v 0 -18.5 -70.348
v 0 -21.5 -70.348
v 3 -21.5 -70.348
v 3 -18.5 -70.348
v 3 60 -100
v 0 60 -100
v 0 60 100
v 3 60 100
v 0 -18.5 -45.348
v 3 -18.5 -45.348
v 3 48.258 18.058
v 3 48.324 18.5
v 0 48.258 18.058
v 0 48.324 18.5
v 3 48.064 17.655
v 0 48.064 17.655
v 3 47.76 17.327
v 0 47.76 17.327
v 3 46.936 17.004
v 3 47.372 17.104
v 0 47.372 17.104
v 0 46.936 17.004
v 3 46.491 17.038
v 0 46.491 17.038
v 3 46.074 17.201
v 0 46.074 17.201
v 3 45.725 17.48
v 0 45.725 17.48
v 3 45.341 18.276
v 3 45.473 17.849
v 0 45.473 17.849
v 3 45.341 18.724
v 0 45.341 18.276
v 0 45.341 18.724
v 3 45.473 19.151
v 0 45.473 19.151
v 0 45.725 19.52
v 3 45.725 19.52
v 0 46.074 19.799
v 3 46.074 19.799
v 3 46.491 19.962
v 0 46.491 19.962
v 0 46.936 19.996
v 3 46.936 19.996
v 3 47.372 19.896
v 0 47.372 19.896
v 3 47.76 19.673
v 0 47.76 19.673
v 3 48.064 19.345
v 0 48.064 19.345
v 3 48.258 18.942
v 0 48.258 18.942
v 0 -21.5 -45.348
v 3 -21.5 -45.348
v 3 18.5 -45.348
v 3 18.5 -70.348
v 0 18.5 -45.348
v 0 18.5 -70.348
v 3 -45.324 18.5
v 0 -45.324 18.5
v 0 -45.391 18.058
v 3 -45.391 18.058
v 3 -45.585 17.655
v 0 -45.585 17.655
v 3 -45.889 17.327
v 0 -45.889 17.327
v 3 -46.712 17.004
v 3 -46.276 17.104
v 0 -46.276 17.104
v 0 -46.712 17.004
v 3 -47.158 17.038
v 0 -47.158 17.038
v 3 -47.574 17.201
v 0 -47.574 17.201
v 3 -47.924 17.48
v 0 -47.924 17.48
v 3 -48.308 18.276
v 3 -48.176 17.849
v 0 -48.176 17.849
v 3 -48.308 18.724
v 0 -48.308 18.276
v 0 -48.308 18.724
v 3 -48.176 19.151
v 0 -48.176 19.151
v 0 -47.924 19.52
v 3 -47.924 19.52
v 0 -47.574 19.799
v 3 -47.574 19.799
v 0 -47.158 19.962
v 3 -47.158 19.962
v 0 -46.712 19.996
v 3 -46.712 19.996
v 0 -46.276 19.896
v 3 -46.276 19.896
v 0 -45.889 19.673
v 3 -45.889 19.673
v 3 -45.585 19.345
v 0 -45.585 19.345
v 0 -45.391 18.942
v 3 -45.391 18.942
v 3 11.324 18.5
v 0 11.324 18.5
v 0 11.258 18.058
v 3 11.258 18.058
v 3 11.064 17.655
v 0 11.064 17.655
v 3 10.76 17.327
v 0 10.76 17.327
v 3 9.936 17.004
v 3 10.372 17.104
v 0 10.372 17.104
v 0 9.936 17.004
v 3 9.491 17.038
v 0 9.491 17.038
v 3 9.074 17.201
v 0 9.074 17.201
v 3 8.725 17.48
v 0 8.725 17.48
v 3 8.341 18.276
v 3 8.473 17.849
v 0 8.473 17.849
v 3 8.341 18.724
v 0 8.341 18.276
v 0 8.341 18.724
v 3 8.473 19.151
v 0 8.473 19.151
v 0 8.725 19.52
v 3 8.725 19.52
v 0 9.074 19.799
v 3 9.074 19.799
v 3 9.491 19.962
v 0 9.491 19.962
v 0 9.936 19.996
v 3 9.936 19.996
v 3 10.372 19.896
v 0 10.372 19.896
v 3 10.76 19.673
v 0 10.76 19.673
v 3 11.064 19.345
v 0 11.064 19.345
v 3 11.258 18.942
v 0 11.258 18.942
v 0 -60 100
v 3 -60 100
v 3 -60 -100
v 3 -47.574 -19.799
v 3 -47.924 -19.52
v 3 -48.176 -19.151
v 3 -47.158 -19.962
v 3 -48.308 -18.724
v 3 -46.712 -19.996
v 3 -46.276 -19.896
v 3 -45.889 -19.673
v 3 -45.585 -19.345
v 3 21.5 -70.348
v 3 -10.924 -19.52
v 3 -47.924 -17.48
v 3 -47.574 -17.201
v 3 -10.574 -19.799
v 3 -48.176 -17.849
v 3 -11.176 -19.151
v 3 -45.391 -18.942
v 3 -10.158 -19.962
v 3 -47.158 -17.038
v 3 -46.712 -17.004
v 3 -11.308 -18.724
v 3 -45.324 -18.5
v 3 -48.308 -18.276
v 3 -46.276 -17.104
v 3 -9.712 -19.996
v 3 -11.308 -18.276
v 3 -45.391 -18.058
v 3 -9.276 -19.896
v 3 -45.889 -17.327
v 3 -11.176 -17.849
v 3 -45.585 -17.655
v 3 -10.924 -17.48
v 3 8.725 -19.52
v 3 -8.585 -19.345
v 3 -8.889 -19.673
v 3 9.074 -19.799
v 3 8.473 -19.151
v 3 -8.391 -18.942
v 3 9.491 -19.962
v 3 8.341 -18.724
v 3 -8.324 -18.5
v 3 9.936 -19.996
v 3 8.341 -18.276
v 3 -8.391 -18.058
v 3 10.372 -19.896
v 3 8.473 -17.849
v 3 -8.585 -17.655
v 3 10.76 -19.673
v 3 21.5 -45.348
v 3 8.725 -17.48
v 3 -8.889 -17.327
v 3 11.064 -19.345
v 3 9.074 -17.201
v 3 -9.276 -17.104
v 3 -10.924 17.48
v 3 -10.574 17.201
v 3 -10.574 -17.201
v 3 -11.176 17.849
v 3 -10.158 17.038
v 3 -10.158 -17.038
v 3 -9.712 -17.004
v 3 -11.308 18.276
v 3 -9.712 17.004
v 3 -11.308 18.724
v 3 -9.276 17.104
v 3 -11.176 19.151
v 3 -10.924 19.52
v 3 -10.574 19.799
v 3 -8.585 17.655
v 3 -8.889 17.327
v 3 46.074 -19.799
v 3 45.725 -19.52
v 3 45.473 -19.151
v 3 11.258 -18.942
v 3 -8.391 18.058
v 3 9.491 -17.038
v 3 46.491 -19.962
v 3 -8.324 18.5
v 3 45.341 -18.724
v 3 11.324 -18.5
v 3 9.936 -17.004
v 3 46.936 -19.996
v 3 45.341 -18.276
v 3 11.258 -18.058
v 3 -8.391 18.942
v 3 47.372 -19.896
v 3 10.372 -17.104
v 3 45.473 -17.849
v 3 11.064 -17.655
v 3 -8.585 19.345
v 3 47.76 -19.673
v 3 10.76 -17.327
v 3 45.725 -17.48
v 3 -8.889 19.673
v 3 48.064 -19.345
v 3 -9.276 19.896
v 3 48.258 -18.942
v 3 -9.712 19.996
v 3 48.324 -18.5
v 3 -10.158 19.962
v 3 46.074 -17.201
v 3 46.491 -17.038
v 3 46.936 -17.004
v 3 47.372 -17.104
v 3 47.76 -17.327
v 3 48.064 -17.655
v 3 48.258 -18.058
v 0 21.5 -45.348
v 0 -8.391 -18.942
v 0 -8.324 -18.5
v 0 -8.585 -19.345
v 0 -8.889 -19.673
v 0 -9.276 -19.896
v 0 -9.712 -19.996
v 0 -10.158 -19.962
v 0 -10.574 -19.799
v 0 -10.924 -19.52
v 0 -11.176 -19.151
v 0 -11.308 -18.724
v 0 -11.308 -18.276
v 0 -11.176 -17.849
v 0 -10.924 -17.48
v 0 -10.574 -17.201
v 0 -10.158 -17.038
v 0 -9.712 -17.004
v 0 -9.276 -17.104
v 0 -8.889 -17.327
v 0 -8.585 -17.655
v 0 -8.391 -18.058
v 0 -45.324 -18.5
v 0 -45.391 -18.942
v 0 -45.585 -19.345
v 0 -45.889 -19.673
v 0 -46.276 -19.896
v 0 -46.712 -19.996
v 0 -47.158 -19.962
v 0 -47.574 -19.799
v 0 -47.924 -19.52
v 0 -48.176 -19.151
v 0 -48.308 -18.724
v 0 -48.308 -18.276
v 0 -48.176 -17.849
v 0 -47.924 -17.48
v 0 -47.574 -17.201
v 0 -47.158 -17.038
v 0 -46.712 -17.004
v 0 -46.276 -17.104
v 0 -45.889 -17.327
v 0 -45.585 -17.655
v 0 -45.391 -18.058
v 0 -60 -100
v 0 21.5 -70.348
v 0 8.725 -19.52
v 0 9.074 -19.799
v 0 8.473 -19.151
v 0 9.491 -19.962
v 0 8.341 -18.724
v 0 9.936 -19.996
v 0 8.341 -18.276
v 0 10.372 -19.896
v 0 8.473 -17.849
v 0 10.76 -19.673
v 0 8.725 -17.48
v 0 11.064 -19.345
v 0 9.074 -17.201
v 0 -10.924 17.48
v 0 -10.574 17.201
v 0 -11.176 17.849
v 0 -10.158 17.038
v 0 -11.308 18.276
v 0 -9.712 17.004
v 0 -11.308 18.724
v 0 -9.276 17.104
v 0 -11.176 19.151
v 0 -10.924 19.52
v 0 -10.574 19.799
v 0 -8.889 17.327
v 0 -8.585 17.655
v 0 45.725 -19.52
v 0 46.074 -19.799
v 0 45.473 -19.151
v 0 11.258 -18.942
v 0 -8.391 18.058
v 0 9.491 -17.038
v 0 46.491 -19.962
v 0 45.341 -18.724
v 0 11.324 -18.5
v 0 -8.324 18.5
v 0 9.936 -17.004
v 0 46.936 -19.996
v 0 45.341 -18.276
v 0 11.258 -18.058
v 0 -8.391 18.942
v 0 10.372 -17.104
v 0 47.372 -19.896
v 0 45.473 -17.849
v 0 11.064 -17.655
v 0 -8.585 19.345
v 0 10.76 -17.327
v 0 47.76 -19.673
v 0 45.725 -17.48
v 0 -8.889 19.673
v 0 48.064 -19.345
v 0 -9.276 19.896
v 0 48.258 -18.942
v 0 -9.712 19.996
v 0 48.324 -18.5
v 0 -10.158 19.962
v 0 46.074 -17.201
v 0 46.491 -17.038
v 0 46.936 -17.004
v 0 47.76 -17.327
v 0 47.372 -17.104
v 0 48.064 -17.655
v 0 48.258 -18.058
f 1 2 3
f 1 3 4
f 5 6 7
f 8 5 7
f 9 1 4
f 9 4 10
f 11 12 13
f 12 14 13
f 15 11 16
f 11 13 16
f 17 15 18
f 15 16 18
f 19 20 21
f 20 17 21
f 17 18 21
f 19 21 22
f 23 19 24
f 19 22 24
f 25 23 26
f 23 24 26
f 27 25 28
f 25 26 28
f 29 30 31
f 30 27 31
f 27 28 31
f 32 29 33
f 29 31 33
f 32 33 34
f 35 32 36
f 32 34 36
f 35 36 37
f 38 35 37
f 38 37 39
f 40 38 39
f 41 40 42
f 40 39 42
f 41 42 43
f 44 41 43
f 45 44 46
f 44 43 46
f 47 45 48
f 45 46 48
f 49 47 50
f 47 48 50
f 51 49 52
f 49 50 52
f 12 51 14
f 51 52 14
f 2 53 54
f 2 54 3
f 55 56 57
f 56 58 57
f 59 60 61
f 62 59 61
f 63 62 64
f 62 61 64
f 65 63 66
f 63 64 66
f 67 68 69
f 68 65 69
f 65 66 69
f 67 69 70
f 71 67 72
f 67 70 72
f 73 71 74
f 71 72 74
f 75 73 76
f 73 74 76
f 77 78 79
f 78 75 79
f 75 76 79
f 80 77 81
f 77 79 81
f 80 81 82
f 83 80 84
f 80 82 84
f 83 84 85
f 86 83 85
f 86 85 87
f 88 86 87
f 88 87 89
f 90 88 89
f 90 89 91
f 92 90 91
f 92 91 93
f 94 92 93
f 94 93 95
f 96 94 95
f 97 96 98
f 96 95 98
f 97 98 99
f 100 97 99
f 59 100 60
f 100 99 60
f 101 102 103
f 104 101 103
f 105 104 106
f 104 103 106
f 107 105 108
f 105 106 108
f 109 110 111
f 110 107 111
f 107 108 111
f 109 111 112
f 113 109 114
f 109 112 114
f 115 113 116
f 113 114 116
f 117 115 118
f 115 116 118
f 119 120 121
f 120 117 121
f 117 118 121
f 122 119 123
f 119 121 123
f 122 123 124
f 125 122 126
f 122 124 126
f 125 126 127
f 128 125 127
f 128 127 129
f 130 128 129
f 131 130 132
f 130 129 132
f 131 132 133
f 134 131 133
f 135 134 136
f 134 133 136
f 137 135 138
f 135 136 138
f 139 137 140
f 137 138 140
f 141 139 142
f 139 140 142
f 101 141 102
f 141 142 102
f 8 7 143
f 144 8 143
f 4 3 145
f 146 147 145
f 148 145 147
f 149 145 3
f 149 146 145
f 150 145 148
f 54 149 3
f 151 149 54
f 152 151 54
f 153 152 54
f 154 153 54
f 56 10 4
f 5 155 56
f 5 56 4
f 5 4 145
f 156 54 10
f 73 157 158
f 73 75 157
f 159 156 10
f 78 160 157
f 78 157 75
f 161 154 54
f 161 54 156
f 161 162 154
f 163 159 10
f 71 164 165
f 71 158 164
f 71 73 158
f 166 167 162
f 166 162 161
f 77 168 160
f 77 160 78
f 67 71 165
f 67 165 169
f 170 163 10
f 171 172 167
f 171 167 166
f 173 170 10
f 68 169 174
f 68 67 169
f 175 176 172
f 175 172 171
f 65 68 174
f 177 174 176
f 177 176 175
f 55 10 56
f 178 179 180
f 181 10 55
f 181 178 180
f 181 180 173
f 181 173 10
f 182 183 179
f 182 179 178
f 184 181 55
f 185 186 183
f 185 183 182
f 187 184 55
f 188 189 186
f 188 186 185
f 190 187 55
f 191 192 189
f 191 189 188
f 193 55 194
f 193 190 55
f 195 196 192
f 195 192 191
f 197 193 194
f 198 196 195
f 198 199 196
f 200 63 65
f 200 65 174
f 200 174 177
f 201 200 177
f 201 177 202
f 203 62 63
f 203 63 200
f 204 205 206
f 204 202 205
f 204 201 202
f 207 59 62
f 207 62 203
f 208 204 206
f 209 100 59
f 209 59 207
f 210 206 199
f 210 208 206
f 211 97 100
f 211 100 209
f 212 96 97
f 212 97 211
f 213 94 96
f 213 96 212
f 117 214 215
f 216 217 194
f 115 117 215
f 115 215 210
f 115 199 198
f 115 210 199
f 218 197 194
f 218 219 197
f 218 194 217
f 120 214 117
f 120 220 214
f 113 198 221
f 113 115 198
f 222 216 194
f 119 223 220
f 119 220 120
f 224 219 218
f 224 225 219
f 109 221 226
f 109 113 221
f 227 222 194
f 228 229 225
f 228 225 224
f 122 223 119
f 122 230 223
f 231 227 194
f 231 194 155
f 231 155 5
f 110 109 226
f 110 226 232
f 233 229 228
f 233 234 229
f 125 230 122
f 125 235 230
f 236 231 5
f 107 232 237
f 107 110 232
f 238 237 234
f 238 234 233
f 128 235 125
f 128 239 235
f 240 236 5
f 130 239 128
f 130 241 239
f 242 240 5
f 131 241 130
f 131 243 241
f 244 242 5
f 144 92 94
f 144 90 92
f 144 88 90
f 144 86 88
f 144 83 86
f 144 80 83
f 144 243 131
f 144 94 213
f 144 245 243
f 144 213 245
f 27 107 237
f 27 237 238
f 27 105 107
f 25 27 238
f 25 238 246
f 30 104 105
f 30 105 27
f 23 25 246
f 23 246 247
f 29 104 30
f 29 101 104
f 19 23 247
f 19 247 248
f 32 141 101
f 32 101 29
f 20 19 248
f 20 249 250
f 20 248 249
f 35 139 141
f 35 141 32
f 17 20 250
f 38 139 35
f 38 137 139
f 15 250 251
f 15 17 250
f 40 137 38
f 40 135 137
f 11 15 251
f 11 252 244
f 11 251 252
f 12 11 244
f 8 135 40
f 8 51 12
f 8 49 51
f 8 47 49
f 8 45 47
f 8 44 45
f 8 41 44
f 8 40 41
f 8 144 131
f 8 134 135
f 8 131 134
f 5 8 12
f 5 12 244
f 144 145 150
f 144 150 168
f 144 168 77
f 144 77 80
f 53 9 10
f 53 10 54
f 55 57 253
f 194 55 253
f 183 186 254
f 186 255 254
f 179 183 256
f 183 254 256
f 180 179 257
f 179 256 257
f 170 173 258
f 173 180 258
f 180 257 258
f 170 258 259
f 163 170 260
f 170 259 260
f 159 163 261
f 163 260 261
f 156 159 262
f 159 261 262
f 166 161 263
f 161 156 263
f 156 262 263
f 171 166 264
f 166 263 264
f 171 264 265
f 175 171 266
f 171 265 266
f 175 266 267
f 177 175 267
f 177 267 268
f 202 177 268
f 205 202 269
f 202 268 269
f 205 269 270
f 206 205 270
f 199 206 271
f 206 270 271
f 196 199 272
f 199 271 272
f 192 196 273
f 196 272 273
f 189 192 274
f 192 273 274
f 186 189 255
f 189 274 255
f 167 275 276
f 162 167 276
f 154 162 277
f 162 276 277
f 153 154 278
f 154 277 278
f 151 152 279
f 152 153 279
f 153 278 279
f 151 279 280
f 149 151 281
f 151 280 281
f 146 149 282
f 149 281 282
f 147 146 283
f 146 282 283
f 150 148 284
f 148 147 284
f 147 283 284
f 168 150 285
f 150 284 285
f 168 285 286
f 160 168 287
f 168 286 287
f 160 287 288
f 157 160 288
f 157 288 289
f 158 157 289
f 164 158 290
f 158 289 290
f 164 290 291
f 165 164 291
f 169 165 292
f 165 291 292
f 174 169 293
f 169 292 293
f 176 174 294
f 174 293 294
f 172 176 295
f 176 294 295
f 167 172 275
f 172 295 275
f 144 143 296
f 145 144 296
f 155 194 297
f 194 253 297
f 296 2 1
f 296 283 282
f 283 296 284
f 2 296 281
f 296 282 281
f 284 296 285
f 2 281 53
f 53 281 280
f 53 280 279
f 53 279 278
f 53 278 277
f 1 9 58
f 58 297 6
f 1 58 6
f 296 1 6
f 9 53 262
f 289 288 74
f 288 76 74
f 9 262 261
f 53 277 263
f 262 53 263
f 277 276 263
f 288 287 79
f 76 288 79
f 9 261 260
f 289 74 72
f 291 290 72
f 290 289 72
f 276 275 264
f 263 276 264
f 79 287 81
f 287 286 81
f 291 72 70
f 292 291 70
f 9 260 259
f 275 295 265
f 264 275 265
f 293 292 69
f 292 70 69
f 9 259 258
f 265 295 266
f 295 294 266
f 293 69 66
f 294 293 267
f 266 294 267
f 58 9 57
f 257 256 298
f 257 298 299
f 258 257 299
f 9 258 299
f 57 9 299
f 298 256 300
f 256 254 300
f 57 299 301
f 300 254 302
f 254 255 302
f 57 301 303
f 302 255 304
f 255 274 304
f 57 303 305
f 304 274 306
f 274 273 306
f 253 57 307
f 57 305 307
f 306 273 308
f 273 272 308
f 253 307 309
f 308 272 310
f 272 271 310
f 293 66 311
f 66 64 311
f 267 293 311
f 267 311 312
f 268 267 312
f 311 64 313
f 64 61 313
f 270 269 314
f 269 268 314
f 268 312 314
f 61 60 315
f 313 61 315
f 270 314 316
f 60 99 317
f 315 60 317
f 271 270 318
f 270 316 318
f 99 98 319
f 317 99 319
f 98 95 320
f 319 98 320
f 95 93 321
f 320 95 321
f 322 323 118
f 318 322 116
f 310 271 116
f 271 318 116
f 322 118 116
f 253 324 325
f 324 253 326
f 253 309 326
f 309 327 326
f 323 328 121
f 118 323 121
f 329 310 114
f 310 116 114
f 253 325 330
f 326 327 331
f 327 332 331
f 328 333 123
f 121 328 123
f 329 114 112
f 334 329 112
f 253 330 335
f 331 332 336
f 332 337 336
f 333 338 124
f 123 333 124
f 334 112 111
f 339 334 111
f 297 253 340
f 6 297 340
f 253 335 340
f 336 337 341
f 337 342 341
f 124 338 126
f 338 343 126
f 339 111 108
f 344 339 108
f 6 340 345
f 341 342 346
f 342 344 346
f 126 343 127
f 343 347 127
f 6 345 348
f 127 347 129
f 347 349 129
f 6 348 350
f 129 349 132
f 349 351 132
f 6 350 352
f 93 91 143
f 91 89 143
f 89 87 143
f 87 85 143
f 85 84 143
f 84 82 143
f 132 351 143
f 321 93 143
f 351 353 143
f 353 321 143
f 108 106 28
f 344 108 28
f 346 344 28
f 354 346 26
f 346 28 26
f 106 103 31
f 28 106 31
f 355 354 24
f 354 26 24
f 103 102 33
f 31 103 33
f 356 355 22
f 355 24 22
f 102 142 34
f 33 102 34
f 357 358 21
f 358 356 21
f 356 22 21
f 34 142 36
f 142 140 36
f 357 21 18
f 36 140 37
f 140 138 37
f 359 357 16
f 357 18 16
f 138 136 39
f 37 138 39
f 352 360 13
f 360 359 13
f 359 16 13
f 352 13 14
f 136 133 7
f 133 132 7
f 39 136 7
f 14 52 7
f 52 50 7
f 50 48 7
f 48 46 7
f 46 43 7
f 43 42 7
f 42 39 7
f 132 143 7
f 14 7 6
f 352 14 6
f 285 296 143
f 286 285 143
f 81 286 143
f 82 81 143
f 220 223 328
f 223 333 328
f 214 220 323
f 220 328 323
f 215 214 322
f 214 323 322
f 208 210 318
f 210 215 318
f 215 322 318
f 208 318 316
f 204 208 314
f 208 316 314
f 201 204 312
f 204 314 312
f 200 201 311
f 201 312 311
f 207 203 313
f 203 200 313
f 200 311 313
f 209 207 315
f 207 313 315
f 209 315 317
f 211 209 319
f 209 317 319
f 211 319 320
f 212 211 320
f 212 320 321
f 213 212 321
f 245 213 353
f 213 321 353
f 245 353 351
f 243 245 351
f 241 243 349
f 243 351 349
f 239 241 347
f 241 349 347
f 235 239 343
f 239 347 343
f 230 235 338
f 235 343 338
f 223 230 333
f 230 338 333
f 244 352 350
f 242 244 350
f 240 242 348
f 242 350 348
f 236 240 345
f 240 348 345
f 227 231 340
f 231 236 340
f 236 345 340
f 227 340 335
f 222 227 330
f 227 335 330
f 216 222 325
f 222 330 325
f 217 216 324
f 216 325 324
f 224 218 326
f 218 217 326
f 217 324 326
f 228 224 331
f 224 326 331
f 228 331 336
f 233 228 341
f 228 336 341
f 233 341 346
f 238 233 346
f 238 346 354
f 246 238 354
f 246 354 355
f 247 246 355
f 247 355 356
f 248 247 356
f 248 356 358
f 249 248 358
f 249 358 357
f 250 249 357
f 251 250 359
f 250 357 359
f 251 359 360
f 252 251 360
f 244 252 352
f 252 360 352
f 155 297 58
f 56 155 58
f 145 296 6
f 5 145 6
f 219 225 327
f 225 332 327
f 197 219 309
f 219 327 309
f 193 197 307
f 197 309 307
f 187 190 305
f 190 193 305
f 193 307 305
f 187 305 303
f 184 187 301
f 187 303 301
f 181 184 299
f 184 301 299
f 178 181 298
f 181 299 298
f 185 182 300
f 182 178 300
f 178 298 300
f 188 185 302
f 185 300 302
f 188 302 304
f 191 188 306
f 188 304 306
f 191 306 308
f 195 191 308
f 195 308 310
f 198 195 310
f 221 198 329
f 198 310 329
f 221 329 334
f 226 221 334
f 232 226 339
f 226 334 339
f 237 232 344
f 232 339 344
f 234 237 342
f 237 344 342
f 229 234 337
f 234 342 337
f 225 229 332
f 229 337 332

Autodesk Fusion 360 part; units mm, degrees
sketch "Sketch1" plane through (0, 0, 0) normal (1, 0, 0) x (0, 1, 0) in component "Motor driver fitter"
  line L0 (-22.5, -22.5) -> (22.5, -22.5)
  line L1 (-47.5, -12.5) -> (-47.5, 12.5)
  line L2 (-22.5, -12.5) -> (-47.5, -12.5)
  circle A0 centre (-29, 6) radius 1.5
  circle A1 centre (-41, -6) radius 1.5
  line L3 (-47.5, 12.5) -> (-22.5, 12.5)
  line L4 (22.5, 22.5) -> (-22.5, 22.5)
  line L5 (22.5, -22.5) -> (22.5, 22.5)
  circle A2 centre (-18.5, 18.5) radius 1.5
  line L6 (-22.5, 22.5) -> (22.5, -22.5) construction
  line L7 (-22.5, -22.5) -> (22.5, 22.5) construction
  circle A3 centre (18.5, 18.5) radius 1.55
  circle A4 centre (-18.5, -18.5) radius 1.55
  circle A5 centre (18.5, -18.5) radius 1.55
  line L8 (-22.5, 22.5) -> (-22.5, 12.5)
  line L9 (-22.5, -12.5) -> (-22.5, -22.5)
  line L10 (-22.5, 12.5) -> (-47.5, -12.5) construction
  line L11 (-41, -6) -> (-47.5, -12.5) construction
  line L12 (-29, 6) -> (-22.5, 12.5) construction
  dimension "d171" = 45
  dimension "d172" = 45
  dimension "d174" = 3
  dimension "d185" = 3
  dimension "d186" = 3
  dimension "d188" = 25
  dimension "d189" = 25
  dimension "d192" = 18.5
  dimension "d193" = 18.5
  dimension "d225" = 16.9706
sketch "Sketch1 (2)" plane through (0, 0, 0) normal (1, 0, 0) x (0, 1, 0) in component "Chassis frame"
  line L0 (-125, 12.5) -> (-125, -12.5)
  circle A0 centre (-106.461, -5.961) radius 1.5
  line L1 (125, -12.5) -> (125, 12.5)
  line L2 (125, 12.5) -> (-125, 12.5)
  circle A1 centre (-118.4999, 5.9999) radius 1.5
  line L3 (-125, -12.5) -> (125, -12.5)
  line L4 (-125, 12.5) -> (125, -12.5) construction
  line L5 (-125, -12.5) -> (125, 12.5) construction
  line L6 (-22.5, 22.5) -> (22.5, -22.5)
  circle A2 centre (-6, 115) radius 1.55
  circle A3 centre (6, 103) radius 1.55
  line L7 (0, 12.5) -> (0, -12.5) construction
  line L8 (-125, 12.5) -> (-100, -12.5) construction
  line L9 (-125, 12.5) -> (-91.4846, 12.5) construction
  line L10 (-125, 12.5) -> (-118.4999, 5.9999) construction
  line L11 (-106.461, -5.961) -> (-100, -12.5) construction
  circle A4 centre (118.4999, 5.9999) radius 1.5
  circle A5 centre (106.461, -5.961) radius 1.5
  circle A6 centre (-49.7943, -5.961) radius 1.5
  circle A7 centre (-61.8332, 5.9999) radius 1.5
  circle A8 centre (6.8724, -5.961) radius 1.5
  circle A9 centre (-5.1666, 5.9999) radius 1.5
  circle A10 centre (63.539, -5.961) radius 1.5
  circle A11 centre (51.5001, 5.9999) radius 1.5
  point P0 (22, -6.0625)
  dimension "d199" = 250
  dimension "d200" = 25
  dimension "d201" = 3
  dimension "d202" = 3
  dimension "d231" = 45
  dimension "d232" = 16.9706
  dimension "d235" = 170
  dimension "d236" = 0
sketch "Sketch1 (3)" plane through (0, 0, 0) normal (1, 0, 0) x (0, 1, 0) in component "Motor fitter"
  line L0 (-12.5, -45) -> (-12.5, 45)
  line L1 (-12.5, 45) -> (12.5, 45)
  line L2 (12.5, 45) -> (12.5, -45)
  line L3 (12.5, -45) -> (-12.5, -45)
  line L4 (-12.5, -45) -> (12.5, 45) construction
  line L5 (-12.5, 45) -> (12.5, -45) construction
  line L6 (-12.5, 45) -> (12.5, 20) construction
  line L7 (-12.5, 45) -> (24.7988, 45) construction
  circle A0 centre (-6, 38.5) radius 1.5 construction
  circle A1 centre (6, 26.5) radius 1.5 construction
  line L8 (6, 26.5) -> (12.5, 20) construction
  line L9 (-6, 38.5) -> (-12.5, 45) construction
  dimension "d222" = 25
  dimension "d223" = 90
  dimension "d227" = 45
  dimension "d228" = 3
  dimension "d229" = 3
  dimension "d230" = 16.9706
sketch "Sketch1 (4)" plane through (0, 0, 0) normal (1, 0, 0) x (0, 1, 0) in component "Breadboard fitter"
  line L0 (-65, 12.5) -> (-40, 12.5)
  line L1 (-40, 12.5) -> (-40, -12.5)
  line L2 (-40, -12.5) -> (-65, -12.5)
  line L3 (-65, -12.5) -> (-65, 12.5)
  line L4 (40, 25) -> (-40, 25)
  line L5 (-40, 25) -> (-40, -25)
  line L6 (-40, -25) -> (40, -25)
  line L7 (40, -25) -> (40, 25)
  line L8 (40, 25) -> (-40, -25) construction
  line L9 (-40, 25) -> (40, -25) construction
  circle A0 centre (-57.0753, -4.5753) radius 1.5 construction
  circle A1 centre (-47.9247, 4.5753) radius 1.5 construction
  line L10 (-47.9247, 4.5753) -> (-40, 12.5) construction
  line L11 (-57.0753, -4.5753) -> (-65, -12.5) construction
  dimension "d237" = 25
  dimension "d238" = 25
  dimension "d239" = 80
  dimension "d240" = 50
  dimension "d241" = 3
  dimension "d242" = 3
  dimension "d244" = 12.9408
  dimension "d245" = 45
sketch "Sketch1 (5)" plane through (0, 0, 0) normal (1, 0, 0) x (0, 1, 0) in component "Integrated frame"
  circle A0 centre (-46.8244, 18.5) radius 1.5
  circle A1 centre (-9.8244, 18.5) radius 1.5
  circle A2 centre (-46.8244, -18.5) radius 1.5
  circle A3 centre (-9.8244, -18.5) radius 1.5
  line L0 (0, 0) -> (0, 35.4619) construction
  line L1 (60, 100) -> (-60, 100)
  line L2 (-60, 100) -> (-60, -100)
  line L3 (-60, -100) -> (60, -100)
  line L4 (60, -100) -> (60, 100)
  line L5 (60, 100) -> (-60, -100) construction
  line L6 (-60, 100) -> (60, -100) construction
  circle A4 centre (46.8244, 18.5) radius 1.5
  circle A5 centre (46.8244, -18.5) radius 1.5
  circle A6 centre (9.8244, -18.5) radius 1.5
  circle A7 centre (9.8244, 18.5) radius 1.5
  line L7 (-18.5, -45.3481) -> (-21.5, -45.3481)
  line L8 (-21.5, -45.3481) -> (-21.5, -70.3481)
  line L9 (-21.5, -70.3481) -> (-18.5, -70.3481)
  line L10 (-18.5, -70.3481) -> (-18.5, -45.3481)
  line L11 (21.5, -45.3481) -> (21.5, -70.3481)
  line L12 (18.5, -70.3481) -> (18.5, -45.3481)
  line L13 (18.5, -45.3481) -> (21.5, -45.3481)
  line L14 (21.5, -70.3481) -> (18.5, -70.3481)
  point P0 (-28.3244, 0)
  dimension "d246" = 3
  dimension "d248" = 18.5
  dimension "d249" = 18.5
  dimension "d252" = 37
  dimension "d253" = -37
  dimension "d261" = 120
  dimension "d262" = 200
  dimension "d264" = 3
  dimension "d265" = 25
  dimension "d266" = 18.5
extrude "Extrude1" add sketch "Sketch1 (5)" along normal blind 3 in component "Integrated frame"
sketch "Laser cut sketch" plane through (3, 0, 0) normal (1, 0, 0) x (0, 1, 0) in component "Integrated frame"
  circle A0 centre (-9.8244, -18.5) radius 1.5
  circle A1 centre (-46.8244, -18.5) radius 1.5
  circle A2 centre (-46.8244, 18.5) radius 1.5
  circle A3 centre (-9.8244, 18.5) radius 1.5
  circle A4 centre (46.8244, 18.5) radius 1.5
  circle A5 centre (46.8244, -18.5) radius 1.5
  circle A6 centre (9.8244, -18.5) radius 1.5
  circle A7 centre (9.8244, 18.5) radius 1.5
  line L0 (-18.5, -45.3481) -> (-18.5, -70.3481)
  line L1 (-18.5, -70.3481) -> (-21.5, -70.3481)
  line L2 (-21.5, -70.3481) -> (-21.5, -45.3481)
  line L3 (-21.5, -45.3481) -> (-18.5, -45.3481)
  line L4 (21.5, -45.3481) -> (21.5, -70.3481)
  line L5 (21.5, -70.3481) -> (18.5, -70.3481)
  line L6 (18.5, -70.3481) -> (18.5, -45.3481)
  line L7 (18.5, -45.3481) -> (21.5, -45.3481)
  line L8 (60, -100) -> (60, 100)
  line L9 (60, 100) -> (-60, 100)
  line L10 (-60, 100) -> (-60, -100)
  line L11 (-60, -100) -> (60, -100)
extrude "Extrude2" [suppressed]
component "Motor driver fitter" placed x (1, 0, 0) y (0, 1, 0) z (0, 0, 1) at (0, 0, 0)
component "Chassis frame" placed x (1, 0, 0) y (0, 1, 0) z (0, 0, 1) at (0, 0, 0)
component "Motor fitter" placed x (1, 0, 0) y (0, 1, 0) z (0, 0, 1) at (0, 0, 0)
component "Breadboard fitter" placed x (1, 0, 0) y (0, 1, 0) z (0, 0, 1) at (0, 0, 0)
component "Integrated frame" placed x (1, 0, 0) y (0, 1, 0) z (0, 0, 1) at (0, 0, 0)
equation "partLength = 250 mm"
equation "partWidth = 25 mm"
equation "boltHole = 3 mm"
equation "boltFromEdgesClose = 10 mm"
equation "boltGap = 12 mm"
equation "boltFromEdgesFar = 40 mm"
equation "boltGapFromSide = ( partWidth - boltGap ) / 2"
equation "d174 = boltHole"
equation "d185 = boltHole"
equation "d186 = boltHole"
equation "d192 = ( 37 / 2 ) * 1 mm"
equation "d193 = ( 37 / 2 ) * 1 mm"
equation "d199 = partLength"
equation "d200 = partWidth"
equation "d201 = boltHole"
equation "d202 = boltHole"
equation "d222 = partWidth"
equation "d225 = boltGapDiag"
equation "boltGapDiag = boltGap * sqrt(2)"
equation "d228 = boltHole"
equation "d229 = boltHole"
equation "d230 = boltGapDiag"
equation "d232 = boltGapDiag"
equation "d241 = boltHole"
equation "d242 = boltHole"
equation "d246 = boltHole"
equation "d248 = ( 37 / 2 ) * 1 mm"
equation "d249 = ( 37 / 2 ) * 1 mm"
equation "d266 = ( 37 / 2 ) * 1 mm"
